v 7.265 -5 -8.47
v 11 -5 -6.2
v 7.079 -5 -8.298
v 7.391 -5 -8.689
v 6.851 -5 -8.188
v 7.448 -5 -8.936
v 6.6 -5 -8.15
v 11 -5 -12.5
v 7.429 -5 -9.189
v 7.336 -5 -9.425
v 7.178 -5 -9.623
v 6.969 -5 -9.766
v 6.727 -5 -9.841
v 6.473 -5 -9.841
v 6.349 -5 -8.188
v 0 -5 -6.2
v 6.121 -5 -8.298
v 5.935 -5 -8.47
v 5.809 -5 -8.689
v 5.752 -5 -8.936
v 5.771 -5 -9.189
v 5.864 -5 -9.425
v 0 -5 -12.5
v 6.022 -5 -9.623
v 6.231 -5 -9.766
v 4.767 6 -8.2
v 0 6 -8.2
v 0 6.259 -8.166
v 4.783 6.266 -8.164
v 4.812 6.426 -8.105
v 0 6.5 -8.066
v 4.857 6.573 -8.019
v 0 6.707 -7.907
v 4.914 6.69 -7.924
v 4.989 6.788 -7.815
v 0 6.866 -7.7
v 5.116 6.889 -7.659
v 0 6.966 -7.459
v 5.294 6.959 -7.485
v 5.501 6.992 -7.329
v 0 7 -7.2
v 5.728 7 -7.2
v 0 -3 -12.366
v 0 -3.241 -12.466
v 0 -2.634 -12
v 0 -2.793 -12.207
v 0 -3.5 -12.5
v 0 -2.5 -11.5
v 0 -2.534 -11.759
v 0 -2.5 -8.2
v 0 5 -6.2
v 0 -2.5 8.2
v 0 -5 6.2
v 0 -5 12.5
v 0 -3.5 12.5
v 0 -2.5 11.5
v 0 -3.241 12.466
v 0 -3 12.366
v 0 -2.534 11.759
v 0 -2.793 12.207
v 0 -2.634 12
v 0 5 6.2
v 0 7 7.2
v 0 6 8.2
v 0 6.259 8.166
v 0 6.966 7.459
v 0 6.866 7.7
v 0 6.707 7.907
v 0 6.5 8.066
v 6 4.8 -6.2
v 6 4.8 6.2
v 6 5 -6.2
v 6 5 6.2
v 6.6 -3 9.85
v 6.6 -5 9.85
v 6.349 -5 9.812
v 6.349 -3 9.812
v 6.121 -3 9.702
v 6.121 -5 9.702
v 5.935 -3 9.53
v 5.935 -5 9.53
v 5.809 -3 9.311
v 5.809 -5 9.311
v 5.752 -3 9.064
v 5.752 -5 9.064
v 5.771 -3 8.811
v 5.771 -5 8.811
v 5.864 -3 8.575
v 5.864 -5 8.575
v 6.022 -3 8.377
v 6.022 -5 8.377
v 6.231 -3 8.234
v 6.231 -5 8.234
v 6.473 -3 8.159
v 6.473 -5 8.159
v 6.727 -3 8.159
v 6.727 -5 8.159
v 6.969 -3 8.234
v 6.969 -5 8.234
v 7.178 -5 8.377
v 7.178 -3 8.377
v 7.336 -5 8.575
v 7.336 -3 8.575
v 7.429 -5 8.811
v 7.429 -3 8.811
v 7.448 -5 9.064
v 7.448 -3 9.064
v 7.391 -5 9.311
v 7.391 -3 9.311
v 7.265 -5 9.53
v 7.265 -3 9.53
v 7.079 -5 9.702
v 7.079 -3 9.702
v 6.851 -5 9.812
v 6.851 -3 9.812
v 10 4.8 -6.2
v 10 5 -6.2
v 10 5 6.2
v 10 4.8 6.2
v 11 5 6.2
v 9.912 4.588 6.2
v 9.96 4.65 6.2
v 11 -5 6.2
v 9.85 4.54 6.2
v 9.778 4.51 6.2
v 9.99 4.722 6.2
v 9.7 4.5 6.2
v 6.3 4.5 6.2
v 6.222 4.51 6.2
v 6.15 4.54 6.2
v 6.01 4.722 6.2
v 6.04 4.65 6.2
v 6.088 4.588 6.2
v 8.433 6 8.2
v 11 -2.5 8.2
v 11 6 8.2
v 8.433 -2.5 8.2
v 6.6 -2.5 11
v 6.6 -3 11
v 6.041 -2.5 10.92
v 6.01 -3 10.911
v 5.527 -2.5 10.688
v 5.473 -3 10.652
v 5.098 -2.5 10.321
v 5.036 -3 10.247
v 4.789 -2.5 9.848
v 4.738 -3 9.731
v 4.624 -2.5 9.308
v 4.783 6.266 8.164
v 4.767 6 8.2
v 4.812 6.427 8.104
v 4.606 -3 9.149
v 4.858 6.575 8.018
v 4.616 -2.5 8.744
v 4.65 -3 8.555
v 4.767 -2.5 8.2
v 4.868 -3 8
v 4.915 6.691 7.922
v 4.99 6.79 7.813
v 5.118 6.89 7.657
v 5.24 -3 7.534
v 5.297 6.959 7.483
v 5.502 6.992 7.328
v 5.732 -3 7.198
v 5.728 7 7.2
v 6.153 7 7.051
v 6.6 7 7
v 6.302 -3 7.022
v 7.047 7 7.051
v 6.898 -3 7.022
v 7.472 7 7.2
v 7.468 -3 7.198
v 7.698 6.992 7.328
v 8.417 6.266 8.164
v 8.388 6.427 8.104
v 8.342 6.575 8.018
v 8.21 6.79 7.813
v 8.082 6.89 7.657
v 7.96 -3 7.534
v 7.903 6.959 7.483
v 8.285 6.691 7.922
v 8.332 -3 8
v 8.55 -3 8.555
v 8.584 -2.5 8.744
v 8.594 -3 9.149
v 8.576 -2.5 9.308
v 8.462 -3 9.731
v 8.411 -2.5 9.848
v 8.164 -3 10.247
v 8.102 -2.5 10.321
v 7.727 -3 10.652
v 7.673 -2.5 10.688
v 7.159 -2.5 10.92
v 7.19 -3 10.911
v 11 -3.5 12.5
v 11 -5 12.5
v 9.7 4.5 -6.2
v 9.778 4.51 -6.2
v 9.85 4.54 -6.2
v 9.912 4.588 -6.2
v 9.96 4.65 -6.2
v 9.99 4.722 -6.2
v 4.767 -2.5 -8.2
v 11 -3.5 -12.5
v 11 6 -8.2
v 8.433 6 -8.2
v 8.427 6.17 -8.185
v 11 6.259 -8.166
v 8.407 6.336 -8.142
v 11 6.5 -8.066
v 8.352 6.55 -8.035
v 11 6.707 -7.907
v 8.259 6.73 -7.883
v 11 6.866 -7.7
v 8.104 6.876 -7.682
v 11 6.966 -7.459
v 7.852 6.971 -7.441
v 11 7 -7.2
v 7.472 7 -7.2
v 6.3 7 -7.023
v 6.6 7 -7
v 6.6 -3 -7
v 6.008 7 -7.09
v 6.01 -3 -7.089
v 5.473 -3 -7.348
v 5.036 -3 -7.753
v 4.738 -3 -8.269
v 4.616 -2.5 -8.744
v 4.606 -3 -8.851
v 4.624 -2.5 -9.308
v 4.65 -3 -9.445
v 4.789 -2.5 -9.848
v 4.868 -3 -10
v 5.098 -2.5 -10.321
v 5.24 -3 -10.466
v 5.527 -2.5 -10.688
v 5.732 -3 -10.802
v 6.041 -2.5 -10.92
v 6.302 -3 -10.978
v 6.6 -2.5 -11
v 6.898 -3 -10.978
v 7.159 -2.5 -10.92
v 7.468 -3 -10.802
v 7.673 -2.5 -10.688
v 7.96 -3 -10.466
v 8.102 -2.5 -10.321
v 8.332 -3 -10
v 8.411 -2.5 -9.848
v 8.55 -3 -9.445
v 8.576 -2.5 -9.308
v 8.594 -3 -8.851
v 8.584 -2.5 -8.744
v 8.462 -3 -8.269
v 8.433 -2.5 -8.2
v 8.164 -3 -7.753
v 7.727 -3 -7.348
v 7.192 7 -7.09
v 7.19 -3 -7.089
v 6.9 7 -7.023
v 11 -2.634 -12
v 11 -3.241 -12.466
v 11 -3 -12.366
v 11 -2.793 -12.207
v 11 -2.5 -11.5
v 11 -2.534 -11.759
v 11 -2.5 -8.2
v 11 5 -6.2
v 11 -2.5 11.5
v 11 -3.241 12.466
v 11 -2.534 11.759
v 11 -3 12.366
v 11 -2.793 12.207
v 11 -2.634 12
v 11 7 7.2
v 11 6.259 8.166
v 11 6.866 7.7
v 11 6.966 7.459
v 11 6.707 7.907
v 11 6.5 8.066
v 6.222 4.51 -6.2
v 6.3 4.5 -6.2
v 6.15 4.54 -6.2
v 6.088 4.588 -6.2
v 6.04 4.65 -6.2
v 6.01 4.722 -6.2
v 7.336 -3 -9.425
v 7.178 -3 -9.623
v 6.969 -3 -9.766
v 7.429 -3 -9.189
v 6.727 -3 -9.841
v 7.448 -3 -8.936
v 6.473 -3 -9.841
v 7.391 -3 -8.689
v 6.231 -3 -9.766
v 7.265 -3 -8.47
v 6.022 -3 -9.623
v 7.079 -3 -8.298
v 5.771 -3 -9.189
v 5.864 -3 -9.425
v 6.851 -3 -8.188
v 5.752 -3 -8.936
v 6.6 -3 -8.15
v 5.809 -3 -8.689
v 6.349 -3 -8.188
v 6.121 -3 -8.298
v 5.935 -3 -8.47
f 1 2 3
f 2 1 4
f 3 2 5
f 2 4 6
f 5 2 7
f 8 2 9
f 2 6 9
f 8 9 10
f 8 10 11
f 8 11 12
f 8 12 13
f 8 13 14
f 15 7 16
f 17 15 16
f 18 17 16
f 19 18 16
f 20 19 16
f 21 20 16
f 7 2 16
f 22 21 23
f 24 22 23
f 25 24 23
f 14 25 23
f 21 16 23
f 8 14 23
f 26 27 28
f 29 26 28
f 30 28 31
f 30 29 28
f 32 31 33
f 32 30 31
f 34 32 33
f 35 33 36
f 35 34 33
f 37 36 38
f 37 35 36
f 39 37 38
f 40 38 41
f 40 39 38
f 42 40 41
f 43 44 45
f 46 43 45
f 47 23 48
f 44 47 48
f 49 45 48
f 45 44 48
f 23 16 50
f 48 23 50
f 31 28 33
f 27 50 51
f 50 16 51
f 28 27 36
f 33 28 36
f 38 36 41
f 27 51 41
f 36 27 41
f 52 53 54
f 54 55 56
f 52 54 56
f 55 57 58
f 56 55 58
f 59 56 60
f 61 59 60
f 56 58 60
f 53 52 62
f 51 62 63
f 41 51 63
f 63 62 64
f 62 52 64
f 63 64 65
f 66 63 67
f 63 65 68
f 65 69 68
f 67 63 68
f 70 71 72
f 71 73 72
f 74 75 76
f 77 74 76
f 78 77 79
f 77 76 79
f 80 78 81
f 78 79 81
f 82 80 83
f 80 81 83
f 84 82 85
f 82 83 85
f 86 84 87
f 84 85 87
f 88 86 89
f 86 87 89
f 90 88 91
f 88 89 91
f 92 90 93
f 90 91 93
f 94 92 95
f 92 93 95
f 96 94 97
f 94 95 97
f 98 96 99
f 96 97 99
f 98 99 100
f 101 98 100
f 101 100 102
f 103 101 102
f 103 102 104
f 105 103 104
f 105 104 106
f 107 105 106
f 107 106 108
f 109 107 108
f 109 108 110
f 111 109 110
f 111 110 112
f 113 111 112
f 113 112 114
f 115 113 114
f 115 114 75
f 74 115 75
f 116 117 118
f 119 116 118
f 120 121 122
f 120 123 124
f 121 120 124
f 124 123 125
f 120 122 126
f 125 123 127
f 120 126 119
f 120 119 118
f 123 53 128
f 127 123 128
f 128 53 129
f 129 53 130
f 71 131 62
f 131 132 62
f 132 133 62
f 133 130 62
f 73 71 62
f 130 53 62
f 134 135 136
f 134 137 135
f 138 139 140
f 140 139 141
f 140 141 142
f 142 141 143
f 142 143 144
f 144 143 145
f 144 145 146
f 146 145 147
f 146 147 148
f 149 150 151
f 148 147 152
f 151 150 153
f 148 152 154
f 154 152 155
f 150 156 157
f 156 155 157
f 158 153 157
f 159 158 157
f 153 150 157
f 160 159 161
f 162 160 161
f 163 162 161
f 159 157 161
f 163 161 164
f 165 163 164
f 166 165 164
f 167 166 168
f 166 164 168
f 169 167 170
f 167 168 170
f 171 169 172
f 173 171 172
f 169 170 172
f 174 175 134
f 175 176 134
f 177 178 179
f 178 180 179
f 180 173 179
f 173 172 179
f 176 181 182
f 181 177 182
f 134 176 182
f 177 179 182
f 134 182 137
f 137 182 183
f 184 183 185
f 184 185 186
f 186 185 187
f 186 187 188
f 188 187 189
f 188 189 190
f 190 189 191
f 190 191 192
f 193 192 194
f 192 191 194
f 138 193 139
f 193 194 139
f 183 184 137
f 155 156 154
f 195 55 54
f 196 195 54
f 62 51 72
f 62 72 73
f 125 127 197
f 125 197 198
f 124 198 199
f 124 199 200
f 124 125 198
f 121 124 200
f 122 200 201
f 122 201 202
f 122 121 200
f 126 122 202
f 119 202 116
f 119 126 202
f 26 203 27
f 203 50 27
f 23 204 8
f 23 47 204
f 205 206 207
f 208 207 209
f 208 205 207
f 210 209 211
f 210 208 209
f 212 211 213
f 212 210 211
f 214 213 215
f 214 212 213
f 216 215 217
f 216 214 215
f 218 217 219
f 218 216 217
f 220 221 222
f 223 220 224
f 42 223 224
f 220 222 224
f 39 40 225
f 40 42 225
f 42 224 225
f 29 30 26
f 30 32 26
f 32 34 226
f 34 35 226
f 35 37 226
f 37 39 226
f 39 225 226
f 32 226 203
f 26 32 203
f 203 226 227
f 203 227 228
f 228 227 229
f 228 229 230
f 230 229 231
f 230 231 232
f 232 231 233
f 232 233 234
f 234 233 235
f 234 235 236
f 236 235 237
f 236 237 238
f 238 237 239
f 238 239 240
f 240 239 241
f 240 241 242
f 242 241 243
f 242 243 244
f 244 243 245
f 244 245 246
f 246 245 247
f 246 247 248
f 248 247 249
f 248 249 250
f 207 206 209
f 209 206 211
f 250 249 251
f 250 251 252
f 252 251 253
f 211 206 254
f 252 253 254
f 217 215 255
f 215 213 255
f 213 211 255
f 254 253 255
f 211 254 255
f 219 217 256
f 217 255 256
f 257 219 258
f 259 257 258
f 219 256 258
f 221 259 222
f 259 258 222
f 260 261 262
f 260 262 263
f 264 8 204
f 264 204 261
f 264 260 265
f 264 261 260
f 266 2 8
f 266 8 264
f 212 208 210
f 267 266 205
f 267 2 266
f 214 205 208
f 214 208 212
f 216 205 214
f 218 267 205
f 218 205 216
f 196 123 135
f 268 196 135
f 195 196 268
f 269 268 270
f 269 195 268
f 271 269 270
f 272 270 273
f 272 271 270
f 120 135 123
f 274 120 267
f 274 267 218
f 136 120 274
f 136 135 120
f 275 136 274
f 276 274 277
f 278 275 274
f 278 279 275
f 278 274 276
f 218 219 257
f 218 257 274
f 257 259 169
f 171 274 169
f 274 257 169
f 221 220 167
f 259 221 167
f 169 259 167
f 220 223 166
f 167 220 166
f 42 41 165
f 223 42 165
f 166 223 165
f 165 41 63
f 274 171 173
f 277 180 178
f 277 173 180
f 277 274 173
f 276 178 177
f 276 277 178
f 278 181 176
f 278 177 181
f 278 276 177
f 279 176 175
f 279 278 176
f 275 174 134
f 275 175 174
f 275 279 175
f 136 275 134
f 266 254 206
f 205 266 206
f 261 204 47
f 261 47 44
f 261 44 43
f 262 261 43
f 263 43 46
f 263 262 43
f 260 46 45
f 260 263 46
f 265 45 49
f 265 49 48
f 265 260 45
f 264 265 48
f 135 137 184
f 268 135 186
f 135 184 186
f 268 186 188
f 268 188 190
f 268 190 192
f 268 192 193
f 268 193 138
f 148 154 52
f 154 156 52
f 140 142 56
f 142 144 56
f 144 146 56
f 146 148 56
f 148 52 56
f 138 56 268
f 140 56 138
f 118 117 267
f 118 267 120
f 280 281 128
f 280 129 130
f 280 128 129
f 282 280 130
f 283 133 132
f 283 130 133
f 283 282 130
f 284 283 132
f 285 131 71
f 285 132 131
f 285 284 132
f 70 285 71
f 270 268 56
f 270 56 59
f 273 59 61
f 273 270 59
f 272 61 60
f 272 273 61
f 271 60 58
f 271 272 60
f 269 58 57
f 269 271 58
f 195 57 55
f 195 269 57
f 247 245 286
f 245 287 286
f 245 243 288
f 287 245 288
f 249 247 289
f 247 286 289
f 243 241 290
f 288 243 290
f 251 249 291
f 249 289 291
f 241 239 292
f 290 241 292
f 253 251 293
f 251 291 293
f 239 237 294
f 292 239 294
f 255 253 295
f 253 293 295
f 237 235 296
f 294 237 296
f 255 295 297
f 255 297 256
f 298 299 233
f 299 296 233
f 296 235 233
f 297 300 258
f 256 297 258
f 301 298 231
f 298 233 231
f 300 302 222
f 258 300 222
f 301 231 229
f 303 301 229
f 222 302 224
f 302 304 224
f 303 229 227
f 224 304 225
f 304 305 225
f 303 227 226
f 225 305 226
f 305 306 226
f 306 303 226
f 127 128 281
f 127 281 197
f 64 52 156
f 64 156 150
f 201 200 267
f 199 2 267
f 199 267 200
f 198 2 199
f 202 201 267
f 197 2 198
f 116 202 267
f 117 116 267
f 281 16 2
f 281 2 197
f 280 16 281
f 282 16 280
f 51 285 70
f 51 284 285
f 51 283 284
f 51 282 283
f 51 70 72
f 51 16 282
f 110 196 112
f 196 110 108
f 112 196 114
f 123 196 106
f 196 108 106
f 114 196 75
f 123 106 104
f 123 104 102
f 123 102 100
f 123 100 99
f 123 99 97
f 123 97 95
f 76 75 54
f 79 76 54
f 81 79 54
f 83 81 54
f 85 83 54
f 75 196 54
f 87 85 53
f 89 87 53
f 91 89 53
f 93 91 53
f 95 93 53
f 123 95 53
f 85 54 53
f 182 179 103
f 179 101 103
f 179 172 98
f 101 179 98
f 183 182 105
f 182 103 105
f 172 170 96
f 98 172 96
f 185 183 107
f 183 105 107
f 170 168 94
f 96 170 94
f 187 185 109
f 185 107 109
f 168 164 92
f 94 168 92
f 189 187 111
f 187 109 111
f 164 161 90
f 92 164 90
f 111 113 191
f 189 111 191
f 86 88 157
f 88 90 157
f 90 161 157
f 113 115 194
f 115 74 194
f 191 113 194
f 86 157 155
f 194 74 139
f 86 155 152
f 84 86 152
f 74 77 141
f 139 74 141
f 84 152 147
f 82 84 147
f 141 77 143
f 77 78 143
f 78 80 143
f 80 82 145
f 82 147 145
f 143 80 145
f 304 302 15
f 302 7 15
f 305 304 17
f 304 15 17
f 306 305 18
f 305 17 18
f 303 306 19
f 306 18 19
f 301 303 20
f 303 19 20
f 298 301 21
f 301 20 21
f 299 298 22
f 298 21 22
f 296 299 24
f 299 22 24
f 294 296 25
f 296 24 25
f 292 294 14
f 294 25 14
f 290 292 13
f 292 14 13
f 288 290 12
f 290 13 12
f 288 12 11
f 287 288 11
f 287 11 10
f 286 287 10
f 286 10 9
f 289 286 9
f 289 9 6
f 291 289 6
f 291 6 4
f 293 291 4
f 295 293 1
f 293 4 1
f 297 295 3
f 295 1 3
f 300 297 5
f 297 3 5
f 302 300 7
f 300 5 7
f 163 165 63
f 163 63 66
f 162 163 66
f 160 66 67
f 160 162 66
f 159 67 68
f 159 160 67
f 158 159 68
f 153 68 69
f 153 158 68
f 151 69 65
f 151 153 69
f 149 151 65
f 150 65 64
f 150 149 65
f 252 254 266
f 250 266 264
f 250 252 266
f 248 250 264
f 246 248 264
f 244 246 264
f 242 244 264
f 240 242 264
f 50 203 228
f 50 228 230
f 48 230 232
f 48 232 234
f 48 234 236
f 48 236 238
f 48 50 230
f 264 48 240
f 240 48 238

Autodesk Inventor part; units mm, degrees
ref_plane "YZ Plane" through (0, 0, 0) normal (1, 0, 0) x (0, 1, 0)
ref_plane "XZ Plane" through (0, 0, 0) normal (0, 1, 0) x (-1, 0, 0)
ref_plane "XY Plane" through (0, 0, 0) normal (0, 0, 1) x (1, 0, 0)
sketch "Sketch1" plane through (0, 0, 0) normal (1, 0, 0) x (0, 1, 0)
  line L0 (-2.5, 12.5) -> (-5, 12.5)
  line L1 (5, -6.2) -> (5, 6.2)
  line L2 (-5, 12.5) -> (-5, 6.2)
  line L3 (-5, -6.2) -> (-5, -12.5)
  line L4 (-5, 6.2) -> (5, 6.2)
  line L5 (-5, -6.2) -> (5, -6.2)
  line L6 (7, -6.2) -> (7, 8.2)
  line L7 (5, 6.2) -> (5, -6.2)
  line L8 (5, 6.2) -> (-5, 6.2)
  line L9 (-5, 6.2) -> (-5, 8.2)
  line L10 (-2.5, 8.2) -> (7, 8.2)
  line L11 (7, 8.2) -> (7, 6.2)
  line L12 (-5, 6.2) -> (-2.5, 6.2)
  line L13 (-2.5, 8.2) -> (-2.5, 12.5)
  line L14 (-2.5, 12.5) -> (-5, 12.5)
  line L15 (-5, 12.5) -> (-5, 6.2)
  line L16 (5, 6.2) -> (5, 0)
  line L17 (5, 0) -> (-5.8889, 0)
  line L18 (-2.5, -12.5) -> (-5, -12.5)
  line L19 (5, 6.2) -> (5, -6.2)
  line L20 (-5, -12.5) -> (-5, -6.2)
  line L21 (-5, -6.2) -> (5, -6.2)
  line L22 (7, 6.2) -> (7, -8.2)
  line L23 (5, -6.2) -> (5, 6.2)
  line L24 (5, -6.2) -> (-5, -6.2)
  line L25 (-5, -6.2) -> (-5, -8.2)
  line L26 (-2.5, -8.2) -> (7, -8.2)
  line L27 (7, -8.2) -> (7, -6.2)
  line L28 (-5, -6.2) -> (-2.5, -6.2)
  line L29 (-2.5, -8.2) -> (-2.5, -12.5)
  line L30 (-2.5, -12.5) -> (-5, -12.5)
  line L31 (-5, -12.5) -> (-5, -6.2)
  line L32 (5, -6.2) -> (5, 0)
  dimension "d1" = 25
  dimension "d2" = 6.3
  dimension "d5" = 10
  dimension "d6" = 10
  dimension "d9" = 2
  dimension "d10" = 2.5
  dimension "d11" = 6.2
extrude "Extrusion1" add sketch "Sketch1" along normal blind 11
sketch "Sketch2" plane through (0, -2.5, 12.5) normal (0, 1, 0) x (1, 0, 0)
  line L0 (0, 4.3) -> (0, 0) projected
  line L1 (0, 0) -> (11, 0) projected
  line L2 (6.6, 0) -> (6.6, 3.5)
  line L3 (6.6, 3.5) -> (0, 3.5)
  point P0 (0, 12.5)
  dimension "d15" = 3.5
  dimension "d16" = 6.6
hole "Hole1" at (6.6, -2.5, 9) direction (0, -1, 0) diameter 1.7 depth 5.692
sketch "Sketch3" plane through (0, -2.5, -8.2) normal (0, 1, 0) x (1, 0, 0)
  line L0 (0, 4.3) -> (11, 4.3) projected
  line L1 (0, 4.3) -> (6.6, 4.3)
  line L2 (6.6, 4.3) -> (6.6, 0.8)
  line L3 (6.6, 4.3) -> (10.1, 4.3) construction
  point P0 (0, -8.2)
  dimension "d24" = 6.6
  dimension "d25" = 3.5
  dimension "d26" = 90
hole "Hole2" at (6.6, -2.5, -9) direction (0, -1, 0) diameter 1.7 depth 5.692
sketch "Sketch4" plane through (0, 7, 8.2) normal (0, 1, 0) x (1, 0, 0)
  arc A0 (6.3128, 0) -> (6.8872, 0) centre (6.6, -0.8) ccw projected
  arc A1 (6.8872, 16.4) -> (6.3128, 16.4) centre (6.6, 17.2) ccw projected
  point P0 (0, 8.2)
hole "Hole3" at (6.6, 7, 9) at (6.6, 7, -9) direction (0, -1, 0) diameter 4 depth 10
fillet "Fillet1" radius 1 6 edges at (2.3835, 7, -8.2) (2.3835, 7, 8.2) (9.7165, 7, 8.2) (9.7165, 7, -8.2) (5.5, -2.5, 12.5) (5.5, -2.5, -12.5)
sketch "Sketch5" plane through (0, 5, -6.2) normal (0, -1, 0) x (1, 0, 0)
  line L0 (11, 12.4) -> (11, 0) projected
  line L1 (0, 12.4) -> (11, 12.4) projected
  line L2 (11, 12.4) -> (10, 12.4)
  line L3 (10, 12.4) -> (6, 12.4)
  line L4 (0, 0) -> (11, 0) projected
  line L5 (10, 12.4) -> (6, 12.4)
  line L6 (6, 12.4) -> (6, 0)
  line L7 (6, 0) -> (10, 0)
  line L8 (10, 0) -> (10, 12.4)
  point P0 (0, 6.2)
  point P1 (10, 0)
  dimension "d42" = 1
  dimension "d43" = 4
extrude "Extrusion2" add sketch "Sketch5" along normal blind 0.5 contours L8 L4 L6 L1
fillet "Fillet2" radius 0.3 2 edges at (10, 4.5, 0) (6, 4.5, 0)
properties part number "soporte velo"
